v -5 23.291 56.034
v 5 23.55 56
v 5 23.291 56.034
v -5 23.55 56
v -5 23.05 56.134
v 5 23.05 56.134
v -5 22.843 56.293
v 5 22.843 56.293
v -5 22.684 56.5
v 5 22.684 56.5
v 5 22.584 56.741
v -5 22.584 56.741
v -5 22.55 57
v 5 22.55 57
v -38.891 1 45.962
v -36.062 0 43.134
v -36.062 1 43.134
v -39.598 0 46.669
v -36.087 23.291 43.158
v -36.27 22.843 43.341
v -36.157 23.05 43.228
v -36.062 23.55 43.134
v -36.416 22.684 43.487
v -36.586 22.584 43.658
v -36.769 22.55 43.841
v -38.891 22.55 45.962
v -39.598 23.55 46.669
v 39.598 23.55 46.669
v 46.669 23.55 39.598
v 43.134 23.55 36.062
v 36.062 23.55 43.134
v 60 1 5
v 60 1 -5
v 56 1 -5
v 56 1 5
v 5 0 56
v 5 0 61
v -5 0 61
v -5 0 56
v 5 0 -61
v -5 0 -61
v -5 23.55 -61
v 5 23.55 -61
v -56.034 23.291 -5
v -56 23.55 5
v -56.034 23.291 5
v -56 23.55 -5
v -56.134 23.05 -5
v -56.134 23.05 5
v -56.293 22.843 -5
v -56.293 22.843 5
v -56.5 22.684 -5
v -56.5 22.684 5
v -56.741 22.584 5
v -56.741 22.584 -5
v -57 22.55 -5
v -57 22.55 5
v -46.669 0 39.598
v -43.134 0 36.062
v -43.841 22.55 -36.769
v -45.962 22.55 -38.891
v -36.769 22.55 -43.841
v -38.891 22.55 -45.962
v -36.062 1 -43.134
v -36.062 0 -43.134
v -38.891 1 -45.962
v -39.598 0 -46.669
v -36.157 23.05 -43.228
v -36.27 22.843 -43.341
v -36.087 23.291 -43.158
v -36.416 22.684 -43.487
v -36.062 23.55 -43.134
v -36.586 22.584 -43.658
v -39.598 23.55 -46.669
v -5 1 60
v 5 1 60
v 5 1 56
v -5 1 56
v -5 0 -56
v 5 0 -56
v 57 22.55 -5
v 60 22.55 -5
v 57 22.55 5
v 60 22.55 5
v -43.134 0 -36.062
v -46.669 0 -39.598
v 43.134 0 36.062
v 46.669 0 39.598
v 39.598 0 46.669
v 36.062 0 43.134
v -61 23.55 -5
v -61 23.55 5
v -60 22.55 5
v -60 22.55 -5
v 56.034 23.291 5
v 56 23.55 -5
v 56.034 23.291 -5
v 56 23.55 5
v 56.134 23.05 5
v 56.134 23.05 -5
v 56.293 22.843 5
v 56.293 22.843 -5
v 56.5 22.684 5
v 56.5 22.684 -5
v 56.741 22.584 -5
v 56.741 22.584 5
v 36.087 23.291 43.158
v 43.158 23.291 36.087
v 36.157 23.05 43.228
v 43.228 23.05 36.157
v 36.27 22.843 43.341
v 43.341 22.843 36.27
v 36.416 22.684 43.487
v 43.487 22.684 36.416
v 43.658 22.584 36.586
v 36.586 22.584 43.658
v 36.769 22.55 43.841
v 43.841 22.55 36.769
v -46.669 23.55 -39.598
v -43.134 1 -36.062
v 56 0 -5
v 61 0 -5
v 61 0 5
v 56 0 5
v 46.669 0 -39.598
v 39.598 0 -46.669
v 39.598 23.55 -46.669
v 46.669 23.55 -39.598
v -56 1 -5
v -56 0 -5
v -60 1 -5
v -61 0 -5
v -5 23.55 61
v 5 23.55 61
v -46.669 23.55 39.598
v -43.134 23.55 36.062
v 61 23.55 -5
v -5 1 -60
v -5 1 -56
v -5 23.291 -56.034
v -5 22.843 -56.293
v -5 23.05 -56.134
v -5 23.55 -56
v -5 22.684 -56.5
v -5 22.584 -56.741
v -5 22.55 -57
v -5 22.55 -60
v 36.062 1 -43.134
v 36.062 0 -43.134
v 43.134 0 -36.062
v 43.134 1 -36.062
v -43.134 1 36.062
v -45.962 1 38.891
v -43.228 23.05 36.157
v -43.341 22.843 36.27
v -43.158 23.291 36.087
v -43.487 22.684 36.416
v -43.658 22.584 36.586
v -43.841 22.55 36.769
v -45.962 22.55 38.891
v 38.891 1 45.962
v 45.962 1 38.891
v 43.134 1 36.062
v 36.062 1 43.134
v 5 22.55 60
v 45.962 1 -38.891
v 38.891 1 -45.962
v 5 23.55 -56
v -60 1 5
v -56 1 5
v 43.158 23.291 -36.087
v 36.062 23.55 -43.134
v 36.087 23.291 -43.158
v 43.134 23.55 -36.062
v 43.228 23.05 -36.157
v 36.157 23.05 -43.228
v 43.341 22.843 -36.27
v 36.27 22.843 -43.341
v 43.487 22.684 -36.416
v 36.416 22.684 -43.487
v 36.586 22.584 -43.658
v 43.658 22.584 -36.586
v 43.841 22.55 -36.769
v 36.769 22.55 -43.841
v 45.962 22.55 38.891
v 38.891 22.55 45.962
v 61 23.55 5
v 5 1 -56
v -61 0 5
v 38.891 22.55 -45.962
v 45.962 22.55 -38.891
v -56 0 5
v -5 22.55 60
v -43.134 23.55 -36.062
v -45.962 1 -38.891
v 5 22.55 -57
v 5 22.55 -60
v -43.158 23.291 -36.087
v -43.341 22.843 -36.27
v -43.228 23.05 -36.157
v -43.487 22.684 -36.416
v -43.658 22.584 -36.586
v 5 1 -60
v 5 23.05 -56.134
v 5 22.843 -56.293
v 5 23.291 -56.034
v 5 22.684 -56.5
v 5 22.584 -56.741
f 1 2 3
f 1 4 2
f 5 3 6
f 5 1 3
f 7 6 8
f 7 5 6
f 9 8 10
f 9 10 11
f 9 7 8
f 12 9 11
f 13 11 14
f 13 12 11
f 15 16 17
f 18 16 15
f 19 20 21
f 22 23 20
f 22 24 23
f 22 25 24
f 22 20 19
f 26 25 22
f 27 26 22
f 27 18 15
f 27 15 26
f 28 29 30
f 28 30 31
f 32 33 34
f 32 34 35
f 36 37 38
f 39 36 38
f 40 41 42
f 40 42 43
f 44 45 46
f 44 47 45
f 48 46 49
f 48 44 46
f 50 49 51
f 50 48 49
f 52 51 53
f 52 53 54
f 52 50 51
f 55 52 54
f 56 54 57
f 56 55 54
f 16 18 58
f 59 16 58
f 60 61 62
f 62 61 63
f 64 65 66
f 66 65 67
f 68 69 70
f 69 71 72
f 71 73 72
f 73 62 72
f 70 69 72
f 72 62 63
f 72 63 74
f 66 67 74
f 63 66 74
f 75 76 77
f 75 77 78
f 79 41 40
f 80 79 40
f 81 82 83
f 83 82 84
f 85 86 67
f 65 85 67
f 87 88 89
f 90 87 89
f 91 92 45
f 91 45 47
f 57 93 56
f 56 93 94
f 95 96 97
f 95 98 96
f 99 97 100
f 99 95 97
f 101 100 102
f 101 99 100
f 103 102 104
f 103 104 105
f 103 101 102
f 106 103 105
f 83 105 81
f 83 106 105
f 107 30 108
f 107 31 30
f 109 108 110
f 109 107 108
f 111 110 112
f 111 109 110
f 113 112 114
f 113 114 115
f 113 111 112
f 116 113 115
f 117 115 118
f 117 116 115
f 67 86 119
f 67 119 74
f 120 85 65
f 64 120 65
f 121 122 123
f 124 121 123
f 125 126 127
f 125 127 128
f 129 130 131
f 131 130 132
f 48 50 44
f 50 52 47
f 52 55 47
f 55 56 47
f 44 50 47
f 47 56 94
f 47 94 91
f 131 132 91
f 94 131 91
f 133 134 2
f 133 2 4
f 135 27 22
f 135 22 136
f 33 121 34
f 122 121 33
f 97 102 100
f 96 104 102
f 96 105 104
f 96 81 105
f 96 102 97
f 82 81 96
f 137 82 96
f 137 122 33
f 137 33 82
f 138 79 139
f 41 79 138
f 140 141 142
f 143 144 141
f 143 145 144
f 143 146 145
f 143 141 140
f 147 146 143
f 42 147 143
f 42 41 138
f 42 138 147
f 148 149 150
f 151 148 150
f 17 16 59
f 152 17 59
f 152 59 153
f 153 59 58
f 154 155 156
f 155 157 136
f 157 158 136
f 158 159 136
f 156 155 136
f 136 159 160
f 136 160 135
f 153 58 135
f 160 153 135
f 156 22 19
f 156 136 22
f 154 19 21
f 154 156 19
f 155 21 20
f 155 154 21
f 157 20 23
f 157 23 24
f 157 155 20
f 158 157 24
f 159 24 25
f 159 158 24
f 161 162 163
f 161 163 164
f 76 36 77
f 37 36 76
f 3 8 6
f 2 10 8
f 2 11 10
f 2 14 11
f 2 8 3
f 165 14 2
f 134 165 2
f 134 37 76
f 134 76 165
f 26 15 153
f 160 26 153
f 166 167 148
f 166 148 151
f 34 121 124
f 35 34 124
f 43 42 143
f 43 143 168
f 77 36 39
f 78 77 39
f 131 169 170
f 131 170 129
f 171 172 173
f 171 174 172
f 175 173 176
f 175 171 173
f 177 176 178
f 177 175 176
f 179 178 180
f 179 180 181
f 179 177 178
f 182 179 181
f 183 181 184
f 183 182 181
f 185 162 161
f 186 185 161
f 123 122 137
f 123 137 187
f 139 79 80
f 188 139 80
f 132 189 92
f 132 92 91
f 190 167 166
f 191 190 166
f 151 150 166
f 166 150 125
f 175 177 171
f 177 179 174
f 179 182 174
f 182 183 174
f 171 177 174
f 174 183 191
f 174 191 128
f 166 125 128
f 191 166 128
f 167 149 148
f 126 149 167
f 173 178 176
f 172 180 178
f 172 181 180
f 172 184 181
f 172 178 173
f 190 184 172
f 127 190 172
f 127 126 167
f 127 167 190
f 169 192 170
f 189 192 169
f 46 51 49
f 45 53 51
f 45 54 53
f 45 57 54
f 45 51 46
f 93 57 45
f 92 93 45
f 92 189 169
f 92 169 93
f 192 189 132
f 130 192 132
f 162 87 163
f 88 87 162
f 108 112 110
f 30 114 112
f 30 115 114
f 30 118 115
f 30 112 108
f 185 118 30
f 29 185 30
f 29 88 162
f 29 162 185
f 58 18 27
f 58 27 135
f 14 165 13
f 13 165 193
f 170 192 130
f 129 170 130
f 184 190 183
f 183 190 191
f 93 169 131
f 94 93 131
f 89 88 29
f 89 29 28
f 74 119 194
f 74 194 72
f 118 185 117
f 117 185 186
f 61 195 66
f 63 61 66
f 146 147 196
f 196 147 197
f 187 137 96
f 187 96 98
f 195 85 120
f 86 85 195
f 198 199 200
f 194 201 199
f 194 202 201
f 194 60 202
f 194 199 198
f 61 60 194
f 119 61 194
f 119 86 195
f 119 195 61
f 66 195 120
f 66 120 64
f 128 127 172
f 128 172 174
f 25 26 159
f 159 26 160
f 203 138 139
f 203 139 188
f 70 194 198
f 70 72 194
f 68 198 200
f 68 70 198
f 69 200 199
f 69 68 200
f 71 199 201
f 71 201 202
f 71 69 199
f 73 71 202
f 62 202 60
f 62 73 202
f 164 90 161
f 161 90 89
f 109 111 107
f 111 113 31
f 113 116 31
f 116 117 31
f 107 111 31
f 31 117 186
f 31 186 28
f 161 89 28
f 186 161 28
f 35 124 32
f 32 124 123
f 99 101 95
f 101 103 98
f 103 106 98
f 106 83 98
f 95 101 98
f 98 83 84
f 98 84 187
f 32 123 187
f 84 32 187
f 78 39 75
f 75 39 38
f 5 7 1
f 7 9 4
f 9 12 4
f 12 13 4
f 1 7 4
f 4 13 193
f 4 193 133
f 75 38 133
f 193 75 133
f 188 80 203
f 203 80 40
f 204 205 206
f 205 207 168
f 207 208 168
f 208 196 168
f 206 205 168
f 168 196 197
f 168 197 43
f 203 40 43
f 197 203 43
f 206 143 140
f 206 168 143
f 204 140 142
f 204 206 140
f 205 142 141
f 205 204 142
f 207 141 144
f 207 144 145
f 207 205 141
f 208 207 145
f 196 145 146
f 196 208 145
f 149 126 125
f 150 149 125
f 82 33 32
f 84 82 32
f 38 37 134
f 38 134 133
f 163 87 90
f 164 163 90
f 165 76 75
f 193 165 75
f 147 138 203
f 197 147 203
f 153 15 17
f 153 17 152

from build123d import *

# Parameters (mm, degrees)
SKETCH1_W           = 10
SKETCH1_H           = 5
BOSS_EXTRUDE1_DEPTH = 1
SKETCH2_W           = 10
SKETCH2_H           = 1
BOSS_EXTRUDE2_DEPTH = 22.55
SKETCH3_W           = 10
SKETCH3_H           = 1
BOSS_EXTRUDE3_DEPTH = 4
FILLET1_R           = 1
CIRPATTERN1_COUNT   = 8


with BuildPart() as part:
    # Sketch1 → Boss-Extrude1 (new body)
    with BuildSketch(Plane(origin=(0, 0, 0), x_dir=(1, 0, 0), z_dir=(0, 1, 0))):
        with Locations((0, 58.5)):
            Rectangle(SKETCH1_W, SKETCH1_H)
    extrude(amount=BOSS_EXTRUDE1_DEPTH)

    # Sketch2 → Boss-Extrude2 (add)
    with BuildSketch(Plane(origin=(0, 1, 0), x_dir=(1, 0, 0), z_dir=(0, 1, 0))):
        with Locations((0, 60.5)):
            Rectangle(SKETCH2_W, SKETCH2_H)
    extrude(amount=BOSS_EXTRUDE2_DEPTH)

    # Sketch3 → Boss-Extrude3 (add)
    with BuildSketch(Plane.XY.offset(-60)):
        with Locations((0, 23.05)):
            Rectangle(SKETCH3_W, SKETCH3_H)
    extrude(amount=BOSS_EXTRUDE3_DEPTH)

    # Fillet1
    fillet1_edges = [part.edges().sort_by_distance(p)[0] for p in [
        (0, 22.55, -56),
    ]]
    fillet(fillet1_edges, radius=FILLET1_R - 0.0001)  # a hair under: the kernel refuses the full size


with BuildPart() as cirpattern1_1:
    # CirPattern1: pattern copy
    add(part.part.rotate(Axis((0, 0, 0), (0, 1, 0)), 1 * 360 / CIRPATTERN1_COUNT))


with BuildPart() as cirpattern1_2:
    # CirPattern1: pattern copy
    add(part.part.rotate(Axis((0, 0, 0), (0, 1, 0)), 2 * 360 / CIRPATTERN1_COUNT))


with BuildPart() as cirpattern1_3:
    # CirPattern1: pattern copy
    add(part.part.rotate(Axis((0, 0, 0), (0, 1, 0)), 3 * 360 / CIRPATTERN1_COUNT))


with BuildPart() as cirpattern1_4:
    # CirPattern1: pattern copy
    add(part.part.rotate(Axis((0, 0, 0), (0, 1, 0)), 4 * 360 / CIRPATTERN1_COUNT))


with BuildPart() as cirpattern1_5:
    # CirPattern1: pattern copy
    add(part.part.rotate(Axis((0, 0, 0), (0, 1, 0)), 5 * 360 / CIRPATTERN1_COUNT))


with BuildPart() as cirpattern1_6:
    # CirPattern1: pattern copy
    add(part.part.rotate(Axis((0, 0, 0), (0, 1, 0)), 6 * 360 / CIRPATTERN1_COUNT))


with BuildPart() as cirpattern1_7:
    # CirPattern1: pattern copy
    add(part.part.rotate(Axis((0, 0, 0), (0, 1, 0)), 7 * 360 / CIRPATTERN1_COUNT))


solid = Compound([part.part, cirpattern1_1.part, cirpattern1_2.part, cirpattern1_3.part, cirpattern1_4.part, cirpattern1_5.part, cirpattern1_6.part, cirpattern1_7.part])
